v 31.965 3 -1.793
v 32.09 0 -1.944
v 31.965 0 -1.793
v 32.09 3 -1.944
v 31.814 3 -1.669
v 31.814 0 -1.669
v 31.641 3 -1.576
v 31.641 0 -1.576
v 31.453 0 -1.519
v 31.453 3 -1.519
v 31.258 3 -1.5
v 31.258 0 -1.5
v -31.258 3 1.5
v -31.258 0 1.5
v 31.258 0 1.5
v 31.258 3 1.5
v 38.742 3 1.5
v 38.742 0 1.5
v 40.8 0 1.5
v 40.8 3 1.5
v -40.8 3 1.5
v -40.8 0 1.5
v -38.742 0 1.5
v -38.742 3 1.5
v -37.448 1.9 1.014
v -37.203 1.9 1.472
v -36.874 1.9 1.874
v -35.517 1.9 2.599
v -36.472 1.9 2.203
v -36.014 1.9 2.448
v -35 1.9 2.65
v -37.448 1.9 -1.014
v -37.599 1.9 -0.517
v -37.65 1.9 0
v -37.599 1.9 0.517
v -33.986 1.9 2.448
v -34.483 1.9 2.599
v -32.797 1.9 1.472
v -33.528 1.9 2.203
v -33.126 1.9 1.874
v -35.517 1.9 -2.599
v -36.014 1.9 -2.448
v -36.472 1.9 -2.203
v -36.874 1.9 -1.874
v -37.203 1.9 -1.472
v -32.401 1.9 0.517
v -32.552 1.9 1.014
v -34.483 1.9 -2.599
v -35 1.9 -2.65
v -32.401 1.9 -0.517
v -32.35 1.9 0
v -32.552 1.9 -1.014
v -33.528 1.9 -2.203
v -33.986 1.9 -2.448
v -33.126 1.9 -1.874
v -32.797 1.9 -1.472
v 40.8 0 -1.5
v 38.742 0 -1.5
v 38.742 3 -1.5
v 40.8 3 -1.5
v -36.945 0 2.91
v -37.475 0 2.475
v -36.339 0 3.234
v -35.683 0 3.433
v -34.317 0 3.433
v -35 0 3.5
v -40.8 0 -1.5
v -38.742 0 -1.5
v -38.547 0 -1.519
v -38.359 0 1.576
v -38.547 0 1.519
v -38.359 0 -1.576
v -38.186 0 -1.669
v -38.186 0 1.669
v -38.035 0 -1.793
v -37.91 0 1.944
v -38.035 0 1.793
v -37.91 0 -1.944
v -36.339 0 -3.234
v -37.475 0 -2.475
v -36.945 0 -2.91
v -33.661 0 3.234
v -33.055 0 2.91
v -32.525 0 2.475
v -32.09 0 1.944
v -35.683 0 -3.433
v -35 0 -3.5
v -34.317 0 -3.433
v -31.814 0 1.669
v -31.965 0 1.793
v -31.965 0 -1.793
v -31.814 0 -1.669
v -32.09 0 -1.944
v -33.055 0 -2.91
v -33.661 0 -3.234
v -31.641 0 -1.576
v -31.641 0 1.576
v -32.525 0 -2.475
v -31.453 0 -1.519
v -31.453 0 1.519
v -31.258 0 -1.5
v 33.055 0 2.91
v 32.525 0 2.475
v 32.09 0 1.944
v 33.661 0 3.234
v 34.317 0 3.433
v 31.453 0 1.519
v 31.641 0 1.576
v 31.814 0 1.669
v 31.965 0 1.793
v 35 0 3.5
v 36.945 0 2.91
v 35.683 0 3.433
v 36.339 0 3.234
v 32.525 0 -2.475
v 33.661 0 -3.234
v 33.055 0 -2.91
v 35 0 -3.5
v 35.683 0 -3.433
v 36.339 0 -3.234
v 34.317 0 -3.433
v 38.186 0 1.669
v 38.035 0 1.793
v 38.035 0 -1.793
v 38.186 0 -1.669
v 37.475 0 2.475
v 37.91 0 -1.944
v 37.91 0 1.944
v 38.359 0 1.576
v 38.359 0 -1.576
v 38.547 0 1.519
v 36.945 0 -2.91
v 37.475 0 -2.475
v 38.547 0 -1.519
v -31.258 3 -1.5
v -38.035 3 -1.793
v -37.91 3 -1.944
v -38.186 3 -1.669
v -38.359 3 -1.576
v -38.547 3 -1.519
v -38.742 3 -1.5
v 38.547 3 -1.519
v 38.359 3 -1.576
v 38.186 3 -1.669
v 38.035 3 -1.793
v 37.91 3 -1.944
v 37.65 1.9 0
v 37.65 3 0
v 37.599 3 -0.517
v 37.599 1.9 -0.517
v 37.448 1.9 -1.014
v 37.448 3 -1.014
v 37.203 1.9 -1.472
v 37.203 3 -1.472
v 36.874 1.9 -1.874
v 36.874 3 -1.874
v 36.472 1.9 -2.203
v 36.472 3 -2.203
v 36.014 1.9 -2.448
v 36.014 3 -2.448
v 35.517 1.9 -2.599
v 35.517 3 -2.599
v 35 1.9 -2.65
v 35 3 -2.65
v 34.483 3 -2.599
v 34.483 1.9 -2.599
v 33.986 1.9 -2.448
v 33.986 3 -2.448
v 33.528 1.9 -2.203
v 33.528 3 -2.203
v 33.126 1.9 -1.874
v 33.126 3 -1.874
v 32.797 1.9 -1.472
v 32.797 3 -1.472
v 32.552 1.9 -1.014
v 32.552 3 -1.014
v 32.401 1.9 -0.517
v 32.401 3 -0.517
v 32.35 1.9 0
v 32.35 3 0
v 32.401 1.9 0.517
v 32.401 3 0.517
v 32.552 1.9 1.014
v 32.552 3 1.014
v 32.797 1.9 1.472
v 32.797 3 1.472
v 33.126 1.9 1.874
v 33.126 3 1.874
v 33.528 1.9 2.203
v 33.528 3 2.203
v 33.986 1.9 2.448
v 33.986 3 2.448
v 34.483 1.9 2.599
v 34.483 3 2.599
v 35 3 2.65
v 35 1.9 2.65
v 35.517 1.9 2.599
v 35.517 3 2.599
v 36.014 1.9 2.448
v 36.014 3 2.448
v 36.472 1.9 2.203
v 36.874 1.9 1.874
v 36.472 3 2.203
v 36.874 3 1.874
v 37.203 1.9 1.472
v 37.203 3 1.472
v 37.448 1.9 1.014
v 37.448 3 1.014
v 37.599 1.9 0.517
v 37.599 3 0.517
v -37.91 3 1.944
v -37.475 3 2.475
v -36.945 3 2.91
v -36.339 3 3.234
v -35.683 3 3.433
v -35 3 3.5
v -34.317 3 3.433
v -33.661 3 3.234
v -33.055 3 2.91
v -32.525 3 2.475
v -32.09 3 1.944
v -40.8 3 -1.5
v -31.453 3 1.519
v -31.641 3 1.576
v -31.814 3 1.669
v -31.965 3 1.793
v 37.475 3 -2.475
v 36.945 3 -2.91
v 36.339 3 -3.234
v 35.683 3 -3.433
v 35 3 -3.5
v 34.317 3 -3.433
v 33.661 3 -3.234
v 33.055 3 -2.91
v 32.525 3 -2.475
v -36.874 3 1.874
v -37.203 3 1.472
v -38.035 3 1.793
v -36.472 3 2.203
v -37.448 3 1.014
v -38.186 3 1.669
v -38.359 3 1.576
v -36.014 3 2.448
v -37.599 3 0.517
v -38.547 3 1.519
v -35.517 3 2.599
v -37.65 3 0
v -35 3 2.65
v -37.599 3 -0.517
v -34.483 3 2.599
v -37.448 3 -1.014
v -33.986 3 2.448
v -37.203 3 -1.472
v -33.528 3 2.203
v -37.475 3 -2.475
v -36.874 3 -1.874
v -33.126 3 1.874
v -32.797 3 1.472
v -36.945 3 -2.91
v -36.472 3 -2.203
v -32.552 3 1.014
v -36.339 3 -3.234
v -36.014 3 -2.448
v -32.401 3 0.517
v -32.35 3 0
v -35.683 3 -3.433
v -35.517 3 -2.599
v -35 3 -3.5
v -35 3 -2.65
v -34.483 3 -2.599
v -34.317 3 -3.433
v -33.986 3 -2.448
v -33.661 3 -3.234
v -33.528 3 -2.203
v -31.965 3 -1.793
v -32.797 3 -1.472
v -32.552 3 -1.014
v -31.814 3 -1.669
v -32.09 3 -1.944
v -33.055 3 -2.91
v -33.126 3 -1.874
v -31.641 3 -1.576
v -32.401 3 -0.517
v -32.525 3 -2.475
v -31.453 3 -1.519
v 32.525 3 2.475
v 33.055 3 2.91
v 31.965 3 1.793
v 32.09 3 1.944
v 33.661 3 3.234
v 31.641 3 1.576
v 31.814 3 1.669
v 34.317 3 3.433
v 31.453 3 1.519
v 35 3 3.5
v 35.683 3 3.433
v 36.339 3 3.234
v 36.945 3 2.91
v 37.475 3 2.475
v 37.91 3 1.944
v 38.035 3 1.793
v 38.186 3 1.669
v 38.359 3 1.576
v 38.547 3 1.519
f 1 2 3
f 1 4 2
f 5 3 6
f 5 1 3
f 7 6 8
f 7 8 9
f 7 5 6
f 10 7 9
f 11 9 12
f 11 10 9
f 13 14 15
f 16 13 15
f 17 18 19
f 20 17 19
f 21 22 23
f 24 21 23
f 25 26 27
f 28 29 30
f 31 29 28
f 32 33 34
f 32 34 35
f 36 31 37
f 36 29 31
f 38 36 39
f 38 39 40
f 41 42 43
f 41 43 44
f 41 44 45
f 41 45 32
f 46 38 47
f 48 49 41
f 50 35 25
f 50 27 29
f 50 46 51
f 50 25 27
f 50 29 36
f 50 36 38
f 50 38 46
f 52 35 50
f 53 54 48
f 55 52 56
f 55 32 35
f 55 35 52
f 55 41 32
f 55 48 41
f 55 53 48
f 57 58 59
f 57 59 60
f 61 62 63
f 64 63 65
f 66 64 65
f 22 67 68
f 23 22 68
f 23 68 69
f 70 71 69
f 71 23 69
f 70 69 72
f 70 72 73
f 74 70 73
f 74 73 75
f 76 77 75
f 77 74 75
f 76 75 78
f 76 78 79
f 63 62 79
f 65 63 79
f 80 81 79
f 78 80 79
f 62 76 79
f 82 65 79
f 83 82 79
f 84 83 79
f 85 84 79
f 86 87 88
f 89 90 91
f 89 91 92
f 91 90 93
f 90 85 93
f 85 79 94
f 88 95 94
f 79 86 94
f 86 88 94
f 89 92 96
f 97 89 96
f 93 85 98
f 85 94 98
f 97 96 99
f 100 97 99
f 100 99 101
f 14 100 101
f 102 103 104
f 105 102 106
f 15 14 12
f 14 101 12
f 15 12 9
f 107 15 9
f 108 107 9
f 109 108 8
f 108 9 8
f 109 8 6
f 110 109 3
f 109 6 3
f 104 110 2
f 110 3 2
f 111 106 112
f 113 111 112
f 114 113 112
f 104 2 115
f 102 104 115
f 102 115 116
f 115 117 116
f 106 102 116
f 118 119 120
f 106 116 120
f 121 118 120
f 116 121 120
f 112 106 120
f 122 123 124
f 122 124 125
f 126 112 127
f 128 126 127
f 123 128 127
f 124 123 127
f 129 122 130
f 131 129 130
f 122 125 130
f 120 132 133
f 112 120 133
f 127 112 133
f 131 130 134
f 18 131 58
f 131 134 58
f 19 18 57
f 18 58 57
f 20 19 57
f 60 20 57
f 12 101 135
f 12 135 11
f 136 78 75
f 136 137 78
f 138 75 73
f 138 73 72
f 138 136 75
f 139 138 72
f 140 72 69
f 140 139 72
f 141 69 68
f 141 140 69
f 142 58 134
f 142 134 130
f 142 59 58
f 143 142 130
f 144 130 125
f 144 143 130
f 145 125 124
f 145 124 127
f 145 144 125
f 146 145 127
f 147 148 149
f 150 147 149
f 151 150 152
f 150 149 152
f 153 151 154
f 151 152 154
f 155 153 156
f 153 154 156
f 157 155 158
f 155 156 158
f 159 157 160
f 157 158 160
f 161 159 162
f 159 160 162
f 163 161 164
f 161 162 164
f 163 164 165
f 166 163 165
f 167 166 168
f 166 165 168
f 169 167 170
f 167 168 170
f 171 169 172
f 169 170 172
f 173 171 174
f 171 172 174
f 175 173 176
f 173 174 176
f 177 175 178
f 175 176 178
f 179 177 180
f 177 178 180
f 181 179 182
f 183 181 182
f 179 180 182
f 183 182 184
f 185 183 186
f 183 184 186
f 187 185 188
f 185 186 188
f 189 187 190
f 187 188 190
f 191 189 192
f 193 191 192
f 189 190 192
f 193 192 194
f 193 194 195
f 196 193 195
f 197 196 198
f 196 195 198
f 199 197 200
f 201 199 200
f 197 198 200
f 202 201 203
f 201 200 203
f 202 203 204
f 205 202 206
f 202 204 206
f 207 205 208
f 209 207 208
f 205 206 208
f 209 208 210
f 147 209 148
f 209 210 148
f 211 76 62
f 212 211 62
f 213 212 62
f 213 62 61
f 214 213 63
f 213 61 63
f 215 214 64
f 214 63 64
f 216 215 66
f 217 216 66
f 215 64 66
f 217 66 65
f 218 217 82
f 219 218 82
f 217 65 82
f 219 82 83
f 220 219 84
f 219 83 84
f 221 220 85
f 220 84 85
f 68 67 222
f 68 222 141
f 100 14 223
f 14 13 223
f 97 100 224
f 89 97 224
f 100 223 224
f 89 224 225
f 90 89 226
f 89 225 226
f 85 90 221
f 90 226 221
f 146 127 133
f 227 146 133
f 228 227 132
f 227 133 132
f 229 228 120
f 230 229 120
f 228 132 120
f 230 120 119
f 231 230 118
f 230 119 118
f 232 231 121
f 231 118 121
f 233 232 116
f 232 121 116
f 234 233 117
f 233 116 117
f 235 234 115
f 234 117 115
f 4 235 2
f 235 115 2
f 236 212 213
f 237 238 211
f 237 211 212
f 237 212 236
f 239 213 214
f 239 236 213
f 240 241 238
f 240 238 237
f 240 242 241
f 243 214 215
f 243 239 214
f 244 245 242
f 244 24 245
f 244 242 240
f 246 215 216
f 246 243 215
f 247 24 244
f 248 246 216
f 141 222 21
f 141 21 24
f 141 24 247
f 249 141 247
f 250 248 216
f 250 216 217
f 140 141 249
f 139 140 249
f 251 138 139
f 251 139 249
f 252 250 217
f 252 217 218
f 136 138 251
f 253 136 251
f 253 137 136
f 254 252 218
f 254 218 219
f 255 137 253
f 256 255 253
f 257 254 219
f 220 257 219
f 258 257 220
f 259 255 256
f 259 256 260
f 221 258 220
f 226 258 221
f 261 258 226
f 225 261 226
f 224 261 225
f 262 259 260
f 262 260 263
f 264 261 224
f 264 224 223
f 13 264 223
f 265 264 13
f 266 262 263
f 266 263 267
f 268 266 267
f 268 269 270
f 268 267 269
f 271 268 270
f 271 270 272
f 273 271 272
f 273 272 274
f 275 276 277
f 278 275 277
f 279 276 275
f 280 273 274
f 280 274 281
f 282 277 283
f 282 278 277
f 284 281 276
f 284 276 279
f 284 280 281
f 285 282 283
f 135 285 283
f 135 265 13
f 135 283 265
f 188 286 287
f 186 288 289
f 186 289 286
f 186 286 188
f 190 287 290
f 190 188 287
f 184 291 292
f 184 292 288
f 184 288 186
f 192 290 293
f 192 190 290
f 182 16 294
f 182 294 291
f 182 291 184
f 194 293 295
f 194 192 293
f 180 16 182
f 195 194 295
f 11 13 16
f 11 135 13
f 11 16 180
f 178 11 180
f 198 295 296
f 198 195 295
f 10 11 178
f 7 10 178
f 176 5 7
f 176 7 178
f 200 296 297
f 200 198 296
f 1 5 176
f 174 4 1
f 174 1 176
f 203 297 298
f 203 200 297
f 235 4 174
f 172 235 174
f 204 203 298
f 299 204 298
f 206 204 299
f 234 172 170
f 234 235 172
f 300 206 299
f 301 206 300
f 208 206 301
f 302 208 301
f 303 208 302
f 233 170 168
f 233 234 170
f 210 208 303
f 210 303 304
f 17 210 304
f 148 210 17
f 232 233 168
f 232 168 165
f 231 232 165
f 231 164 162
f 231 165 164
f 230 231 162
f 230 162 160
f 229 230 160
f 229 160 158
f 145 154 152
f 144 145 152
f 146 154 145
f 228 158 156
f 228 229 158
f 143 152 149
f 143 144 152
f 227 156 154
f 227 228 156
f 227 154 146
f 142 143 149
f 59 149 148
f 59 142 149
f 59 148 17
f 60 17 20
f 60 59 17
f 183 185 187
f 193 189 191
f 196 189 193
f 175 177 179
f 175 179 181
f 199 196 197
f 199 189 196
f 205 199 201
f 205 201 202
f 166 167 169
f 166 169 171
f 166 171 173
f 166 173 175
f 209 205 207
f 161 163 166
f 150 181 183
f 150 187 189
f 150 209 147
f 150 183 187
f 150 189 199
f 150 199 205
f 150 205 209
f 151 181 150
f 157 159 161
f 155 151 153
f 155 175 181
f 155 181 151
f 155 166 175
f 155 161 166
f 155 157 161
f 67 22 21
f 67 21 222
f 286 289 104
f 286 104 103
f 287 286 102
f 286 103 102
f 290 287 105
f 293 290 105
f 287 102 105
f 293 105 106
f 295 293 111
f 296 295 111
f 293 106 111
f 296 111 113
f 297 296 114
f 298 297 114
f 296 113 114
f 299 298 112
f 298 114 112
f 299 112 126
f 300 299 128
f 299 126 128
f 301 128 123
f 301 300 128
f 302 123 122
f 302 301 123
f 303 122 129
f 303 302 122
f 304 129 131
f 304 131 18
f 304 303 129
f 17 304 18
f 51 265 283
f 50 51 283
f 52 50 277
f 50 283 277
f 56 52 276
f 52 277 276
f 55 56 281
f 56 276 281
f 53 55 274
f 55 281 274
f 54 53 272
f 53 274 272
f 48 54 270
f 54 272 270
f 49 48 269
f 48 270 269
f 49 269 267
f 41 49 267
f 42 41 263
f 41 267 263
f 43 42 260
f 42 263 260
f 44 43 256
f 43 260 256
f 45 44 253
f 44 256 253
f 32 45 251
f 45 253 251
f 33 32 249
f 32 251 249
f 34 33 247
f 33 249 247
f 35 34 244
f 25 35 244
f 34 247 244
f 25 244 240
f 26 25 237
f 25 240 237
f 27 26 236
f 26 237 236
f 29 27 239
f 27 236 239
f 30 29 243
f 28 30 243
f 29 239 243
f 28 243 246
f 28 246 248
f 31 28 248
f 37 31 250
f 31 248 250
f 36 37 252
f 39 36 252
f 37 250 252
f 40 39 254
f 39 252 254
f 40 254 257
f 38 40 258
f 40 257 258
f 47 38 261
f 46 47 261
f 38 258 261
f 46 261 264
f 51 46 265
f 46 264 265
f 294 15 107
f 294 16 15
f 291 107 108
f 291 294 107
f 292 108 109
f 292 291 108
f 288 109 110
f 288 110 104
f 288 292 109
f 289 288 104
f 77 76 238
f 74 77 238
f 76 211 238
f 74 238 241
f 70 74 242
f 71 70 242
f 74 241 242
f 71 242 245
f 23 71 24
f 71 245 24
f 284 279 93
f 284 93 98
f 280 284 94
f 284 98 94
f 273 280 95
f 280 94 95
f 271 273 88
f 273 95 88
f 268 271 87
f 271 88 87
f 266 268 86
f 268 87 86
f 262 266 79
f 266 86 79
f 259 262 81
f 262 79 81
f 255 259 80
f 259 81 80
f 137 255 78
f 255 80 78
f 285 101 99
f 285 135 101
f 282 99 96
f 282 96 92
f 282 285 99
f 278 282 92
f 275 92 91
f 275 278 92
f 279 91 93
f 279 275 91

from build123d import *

# Parameters (mm, degrees)
SKETCH1_R          = 3.5
SKETCH1_W          = 81.6
SKETCH1_H          = 3
BASE_SHAPE_DEPTH   = 3
SKETCH2_R          = 2.65
MAGNET_HOLES_DEPTH = 1.1
MILLING_FILLETS_R  = 1


with BuildPart() as part:
    # Sketch1 → Base shape (new body)
    with BuildSketch(Plane(origin=(0, 0, 0), x_dir=(1, 0, 0), z_dir=(0, 1, 0))):
        with Locations((-35, 0)):
            Circle(SKETCH1_R)
        with Locations((35, 0)):
            Circle(SKETCH1_R)
        Rectangle(SKETCH1_W, SKETCH1_H)
    extrude(amount=BASE_SHAPE_DEPTH)

    # Sketch2 → Magnet holes (cut)
    with BuildSketch(Plane(origin=(0, 3, 0), x_dir=(1, 0, 0), z_dir=(0, 1, 0))):
        with Locations((-35, 0)):
            Circle(SKETCH2_R)
        with Locations((35, 0)):
            Circle(SKETCH2_R)
    extrude(amount=-MAGNET_HOLES_DEPTH, mode=Mode.SUBTRACT)

    # Milling fillets
    milling_fillets_edges = [part.edges().sort_by_distance(p)[0] for p in [
        (-38.16227766, 1.5, -1.5),
        (31.83772234, 1.5, -1.5),
        (38.16227766, 1.5, -1.5),
        (31.83772234, 1.5, 1.5),
        (38.16227766, 1.5, 1.5),
        (-31.83772234, 1.5, 1.5),
        (-38.16227766, 1.5, 1.5),
        (-31.83772234, 1.5, -1.5),
    ]]
    fillet(milling_fillets_edges, radius=MILLING_FILLETS_R)


solid = part.part
